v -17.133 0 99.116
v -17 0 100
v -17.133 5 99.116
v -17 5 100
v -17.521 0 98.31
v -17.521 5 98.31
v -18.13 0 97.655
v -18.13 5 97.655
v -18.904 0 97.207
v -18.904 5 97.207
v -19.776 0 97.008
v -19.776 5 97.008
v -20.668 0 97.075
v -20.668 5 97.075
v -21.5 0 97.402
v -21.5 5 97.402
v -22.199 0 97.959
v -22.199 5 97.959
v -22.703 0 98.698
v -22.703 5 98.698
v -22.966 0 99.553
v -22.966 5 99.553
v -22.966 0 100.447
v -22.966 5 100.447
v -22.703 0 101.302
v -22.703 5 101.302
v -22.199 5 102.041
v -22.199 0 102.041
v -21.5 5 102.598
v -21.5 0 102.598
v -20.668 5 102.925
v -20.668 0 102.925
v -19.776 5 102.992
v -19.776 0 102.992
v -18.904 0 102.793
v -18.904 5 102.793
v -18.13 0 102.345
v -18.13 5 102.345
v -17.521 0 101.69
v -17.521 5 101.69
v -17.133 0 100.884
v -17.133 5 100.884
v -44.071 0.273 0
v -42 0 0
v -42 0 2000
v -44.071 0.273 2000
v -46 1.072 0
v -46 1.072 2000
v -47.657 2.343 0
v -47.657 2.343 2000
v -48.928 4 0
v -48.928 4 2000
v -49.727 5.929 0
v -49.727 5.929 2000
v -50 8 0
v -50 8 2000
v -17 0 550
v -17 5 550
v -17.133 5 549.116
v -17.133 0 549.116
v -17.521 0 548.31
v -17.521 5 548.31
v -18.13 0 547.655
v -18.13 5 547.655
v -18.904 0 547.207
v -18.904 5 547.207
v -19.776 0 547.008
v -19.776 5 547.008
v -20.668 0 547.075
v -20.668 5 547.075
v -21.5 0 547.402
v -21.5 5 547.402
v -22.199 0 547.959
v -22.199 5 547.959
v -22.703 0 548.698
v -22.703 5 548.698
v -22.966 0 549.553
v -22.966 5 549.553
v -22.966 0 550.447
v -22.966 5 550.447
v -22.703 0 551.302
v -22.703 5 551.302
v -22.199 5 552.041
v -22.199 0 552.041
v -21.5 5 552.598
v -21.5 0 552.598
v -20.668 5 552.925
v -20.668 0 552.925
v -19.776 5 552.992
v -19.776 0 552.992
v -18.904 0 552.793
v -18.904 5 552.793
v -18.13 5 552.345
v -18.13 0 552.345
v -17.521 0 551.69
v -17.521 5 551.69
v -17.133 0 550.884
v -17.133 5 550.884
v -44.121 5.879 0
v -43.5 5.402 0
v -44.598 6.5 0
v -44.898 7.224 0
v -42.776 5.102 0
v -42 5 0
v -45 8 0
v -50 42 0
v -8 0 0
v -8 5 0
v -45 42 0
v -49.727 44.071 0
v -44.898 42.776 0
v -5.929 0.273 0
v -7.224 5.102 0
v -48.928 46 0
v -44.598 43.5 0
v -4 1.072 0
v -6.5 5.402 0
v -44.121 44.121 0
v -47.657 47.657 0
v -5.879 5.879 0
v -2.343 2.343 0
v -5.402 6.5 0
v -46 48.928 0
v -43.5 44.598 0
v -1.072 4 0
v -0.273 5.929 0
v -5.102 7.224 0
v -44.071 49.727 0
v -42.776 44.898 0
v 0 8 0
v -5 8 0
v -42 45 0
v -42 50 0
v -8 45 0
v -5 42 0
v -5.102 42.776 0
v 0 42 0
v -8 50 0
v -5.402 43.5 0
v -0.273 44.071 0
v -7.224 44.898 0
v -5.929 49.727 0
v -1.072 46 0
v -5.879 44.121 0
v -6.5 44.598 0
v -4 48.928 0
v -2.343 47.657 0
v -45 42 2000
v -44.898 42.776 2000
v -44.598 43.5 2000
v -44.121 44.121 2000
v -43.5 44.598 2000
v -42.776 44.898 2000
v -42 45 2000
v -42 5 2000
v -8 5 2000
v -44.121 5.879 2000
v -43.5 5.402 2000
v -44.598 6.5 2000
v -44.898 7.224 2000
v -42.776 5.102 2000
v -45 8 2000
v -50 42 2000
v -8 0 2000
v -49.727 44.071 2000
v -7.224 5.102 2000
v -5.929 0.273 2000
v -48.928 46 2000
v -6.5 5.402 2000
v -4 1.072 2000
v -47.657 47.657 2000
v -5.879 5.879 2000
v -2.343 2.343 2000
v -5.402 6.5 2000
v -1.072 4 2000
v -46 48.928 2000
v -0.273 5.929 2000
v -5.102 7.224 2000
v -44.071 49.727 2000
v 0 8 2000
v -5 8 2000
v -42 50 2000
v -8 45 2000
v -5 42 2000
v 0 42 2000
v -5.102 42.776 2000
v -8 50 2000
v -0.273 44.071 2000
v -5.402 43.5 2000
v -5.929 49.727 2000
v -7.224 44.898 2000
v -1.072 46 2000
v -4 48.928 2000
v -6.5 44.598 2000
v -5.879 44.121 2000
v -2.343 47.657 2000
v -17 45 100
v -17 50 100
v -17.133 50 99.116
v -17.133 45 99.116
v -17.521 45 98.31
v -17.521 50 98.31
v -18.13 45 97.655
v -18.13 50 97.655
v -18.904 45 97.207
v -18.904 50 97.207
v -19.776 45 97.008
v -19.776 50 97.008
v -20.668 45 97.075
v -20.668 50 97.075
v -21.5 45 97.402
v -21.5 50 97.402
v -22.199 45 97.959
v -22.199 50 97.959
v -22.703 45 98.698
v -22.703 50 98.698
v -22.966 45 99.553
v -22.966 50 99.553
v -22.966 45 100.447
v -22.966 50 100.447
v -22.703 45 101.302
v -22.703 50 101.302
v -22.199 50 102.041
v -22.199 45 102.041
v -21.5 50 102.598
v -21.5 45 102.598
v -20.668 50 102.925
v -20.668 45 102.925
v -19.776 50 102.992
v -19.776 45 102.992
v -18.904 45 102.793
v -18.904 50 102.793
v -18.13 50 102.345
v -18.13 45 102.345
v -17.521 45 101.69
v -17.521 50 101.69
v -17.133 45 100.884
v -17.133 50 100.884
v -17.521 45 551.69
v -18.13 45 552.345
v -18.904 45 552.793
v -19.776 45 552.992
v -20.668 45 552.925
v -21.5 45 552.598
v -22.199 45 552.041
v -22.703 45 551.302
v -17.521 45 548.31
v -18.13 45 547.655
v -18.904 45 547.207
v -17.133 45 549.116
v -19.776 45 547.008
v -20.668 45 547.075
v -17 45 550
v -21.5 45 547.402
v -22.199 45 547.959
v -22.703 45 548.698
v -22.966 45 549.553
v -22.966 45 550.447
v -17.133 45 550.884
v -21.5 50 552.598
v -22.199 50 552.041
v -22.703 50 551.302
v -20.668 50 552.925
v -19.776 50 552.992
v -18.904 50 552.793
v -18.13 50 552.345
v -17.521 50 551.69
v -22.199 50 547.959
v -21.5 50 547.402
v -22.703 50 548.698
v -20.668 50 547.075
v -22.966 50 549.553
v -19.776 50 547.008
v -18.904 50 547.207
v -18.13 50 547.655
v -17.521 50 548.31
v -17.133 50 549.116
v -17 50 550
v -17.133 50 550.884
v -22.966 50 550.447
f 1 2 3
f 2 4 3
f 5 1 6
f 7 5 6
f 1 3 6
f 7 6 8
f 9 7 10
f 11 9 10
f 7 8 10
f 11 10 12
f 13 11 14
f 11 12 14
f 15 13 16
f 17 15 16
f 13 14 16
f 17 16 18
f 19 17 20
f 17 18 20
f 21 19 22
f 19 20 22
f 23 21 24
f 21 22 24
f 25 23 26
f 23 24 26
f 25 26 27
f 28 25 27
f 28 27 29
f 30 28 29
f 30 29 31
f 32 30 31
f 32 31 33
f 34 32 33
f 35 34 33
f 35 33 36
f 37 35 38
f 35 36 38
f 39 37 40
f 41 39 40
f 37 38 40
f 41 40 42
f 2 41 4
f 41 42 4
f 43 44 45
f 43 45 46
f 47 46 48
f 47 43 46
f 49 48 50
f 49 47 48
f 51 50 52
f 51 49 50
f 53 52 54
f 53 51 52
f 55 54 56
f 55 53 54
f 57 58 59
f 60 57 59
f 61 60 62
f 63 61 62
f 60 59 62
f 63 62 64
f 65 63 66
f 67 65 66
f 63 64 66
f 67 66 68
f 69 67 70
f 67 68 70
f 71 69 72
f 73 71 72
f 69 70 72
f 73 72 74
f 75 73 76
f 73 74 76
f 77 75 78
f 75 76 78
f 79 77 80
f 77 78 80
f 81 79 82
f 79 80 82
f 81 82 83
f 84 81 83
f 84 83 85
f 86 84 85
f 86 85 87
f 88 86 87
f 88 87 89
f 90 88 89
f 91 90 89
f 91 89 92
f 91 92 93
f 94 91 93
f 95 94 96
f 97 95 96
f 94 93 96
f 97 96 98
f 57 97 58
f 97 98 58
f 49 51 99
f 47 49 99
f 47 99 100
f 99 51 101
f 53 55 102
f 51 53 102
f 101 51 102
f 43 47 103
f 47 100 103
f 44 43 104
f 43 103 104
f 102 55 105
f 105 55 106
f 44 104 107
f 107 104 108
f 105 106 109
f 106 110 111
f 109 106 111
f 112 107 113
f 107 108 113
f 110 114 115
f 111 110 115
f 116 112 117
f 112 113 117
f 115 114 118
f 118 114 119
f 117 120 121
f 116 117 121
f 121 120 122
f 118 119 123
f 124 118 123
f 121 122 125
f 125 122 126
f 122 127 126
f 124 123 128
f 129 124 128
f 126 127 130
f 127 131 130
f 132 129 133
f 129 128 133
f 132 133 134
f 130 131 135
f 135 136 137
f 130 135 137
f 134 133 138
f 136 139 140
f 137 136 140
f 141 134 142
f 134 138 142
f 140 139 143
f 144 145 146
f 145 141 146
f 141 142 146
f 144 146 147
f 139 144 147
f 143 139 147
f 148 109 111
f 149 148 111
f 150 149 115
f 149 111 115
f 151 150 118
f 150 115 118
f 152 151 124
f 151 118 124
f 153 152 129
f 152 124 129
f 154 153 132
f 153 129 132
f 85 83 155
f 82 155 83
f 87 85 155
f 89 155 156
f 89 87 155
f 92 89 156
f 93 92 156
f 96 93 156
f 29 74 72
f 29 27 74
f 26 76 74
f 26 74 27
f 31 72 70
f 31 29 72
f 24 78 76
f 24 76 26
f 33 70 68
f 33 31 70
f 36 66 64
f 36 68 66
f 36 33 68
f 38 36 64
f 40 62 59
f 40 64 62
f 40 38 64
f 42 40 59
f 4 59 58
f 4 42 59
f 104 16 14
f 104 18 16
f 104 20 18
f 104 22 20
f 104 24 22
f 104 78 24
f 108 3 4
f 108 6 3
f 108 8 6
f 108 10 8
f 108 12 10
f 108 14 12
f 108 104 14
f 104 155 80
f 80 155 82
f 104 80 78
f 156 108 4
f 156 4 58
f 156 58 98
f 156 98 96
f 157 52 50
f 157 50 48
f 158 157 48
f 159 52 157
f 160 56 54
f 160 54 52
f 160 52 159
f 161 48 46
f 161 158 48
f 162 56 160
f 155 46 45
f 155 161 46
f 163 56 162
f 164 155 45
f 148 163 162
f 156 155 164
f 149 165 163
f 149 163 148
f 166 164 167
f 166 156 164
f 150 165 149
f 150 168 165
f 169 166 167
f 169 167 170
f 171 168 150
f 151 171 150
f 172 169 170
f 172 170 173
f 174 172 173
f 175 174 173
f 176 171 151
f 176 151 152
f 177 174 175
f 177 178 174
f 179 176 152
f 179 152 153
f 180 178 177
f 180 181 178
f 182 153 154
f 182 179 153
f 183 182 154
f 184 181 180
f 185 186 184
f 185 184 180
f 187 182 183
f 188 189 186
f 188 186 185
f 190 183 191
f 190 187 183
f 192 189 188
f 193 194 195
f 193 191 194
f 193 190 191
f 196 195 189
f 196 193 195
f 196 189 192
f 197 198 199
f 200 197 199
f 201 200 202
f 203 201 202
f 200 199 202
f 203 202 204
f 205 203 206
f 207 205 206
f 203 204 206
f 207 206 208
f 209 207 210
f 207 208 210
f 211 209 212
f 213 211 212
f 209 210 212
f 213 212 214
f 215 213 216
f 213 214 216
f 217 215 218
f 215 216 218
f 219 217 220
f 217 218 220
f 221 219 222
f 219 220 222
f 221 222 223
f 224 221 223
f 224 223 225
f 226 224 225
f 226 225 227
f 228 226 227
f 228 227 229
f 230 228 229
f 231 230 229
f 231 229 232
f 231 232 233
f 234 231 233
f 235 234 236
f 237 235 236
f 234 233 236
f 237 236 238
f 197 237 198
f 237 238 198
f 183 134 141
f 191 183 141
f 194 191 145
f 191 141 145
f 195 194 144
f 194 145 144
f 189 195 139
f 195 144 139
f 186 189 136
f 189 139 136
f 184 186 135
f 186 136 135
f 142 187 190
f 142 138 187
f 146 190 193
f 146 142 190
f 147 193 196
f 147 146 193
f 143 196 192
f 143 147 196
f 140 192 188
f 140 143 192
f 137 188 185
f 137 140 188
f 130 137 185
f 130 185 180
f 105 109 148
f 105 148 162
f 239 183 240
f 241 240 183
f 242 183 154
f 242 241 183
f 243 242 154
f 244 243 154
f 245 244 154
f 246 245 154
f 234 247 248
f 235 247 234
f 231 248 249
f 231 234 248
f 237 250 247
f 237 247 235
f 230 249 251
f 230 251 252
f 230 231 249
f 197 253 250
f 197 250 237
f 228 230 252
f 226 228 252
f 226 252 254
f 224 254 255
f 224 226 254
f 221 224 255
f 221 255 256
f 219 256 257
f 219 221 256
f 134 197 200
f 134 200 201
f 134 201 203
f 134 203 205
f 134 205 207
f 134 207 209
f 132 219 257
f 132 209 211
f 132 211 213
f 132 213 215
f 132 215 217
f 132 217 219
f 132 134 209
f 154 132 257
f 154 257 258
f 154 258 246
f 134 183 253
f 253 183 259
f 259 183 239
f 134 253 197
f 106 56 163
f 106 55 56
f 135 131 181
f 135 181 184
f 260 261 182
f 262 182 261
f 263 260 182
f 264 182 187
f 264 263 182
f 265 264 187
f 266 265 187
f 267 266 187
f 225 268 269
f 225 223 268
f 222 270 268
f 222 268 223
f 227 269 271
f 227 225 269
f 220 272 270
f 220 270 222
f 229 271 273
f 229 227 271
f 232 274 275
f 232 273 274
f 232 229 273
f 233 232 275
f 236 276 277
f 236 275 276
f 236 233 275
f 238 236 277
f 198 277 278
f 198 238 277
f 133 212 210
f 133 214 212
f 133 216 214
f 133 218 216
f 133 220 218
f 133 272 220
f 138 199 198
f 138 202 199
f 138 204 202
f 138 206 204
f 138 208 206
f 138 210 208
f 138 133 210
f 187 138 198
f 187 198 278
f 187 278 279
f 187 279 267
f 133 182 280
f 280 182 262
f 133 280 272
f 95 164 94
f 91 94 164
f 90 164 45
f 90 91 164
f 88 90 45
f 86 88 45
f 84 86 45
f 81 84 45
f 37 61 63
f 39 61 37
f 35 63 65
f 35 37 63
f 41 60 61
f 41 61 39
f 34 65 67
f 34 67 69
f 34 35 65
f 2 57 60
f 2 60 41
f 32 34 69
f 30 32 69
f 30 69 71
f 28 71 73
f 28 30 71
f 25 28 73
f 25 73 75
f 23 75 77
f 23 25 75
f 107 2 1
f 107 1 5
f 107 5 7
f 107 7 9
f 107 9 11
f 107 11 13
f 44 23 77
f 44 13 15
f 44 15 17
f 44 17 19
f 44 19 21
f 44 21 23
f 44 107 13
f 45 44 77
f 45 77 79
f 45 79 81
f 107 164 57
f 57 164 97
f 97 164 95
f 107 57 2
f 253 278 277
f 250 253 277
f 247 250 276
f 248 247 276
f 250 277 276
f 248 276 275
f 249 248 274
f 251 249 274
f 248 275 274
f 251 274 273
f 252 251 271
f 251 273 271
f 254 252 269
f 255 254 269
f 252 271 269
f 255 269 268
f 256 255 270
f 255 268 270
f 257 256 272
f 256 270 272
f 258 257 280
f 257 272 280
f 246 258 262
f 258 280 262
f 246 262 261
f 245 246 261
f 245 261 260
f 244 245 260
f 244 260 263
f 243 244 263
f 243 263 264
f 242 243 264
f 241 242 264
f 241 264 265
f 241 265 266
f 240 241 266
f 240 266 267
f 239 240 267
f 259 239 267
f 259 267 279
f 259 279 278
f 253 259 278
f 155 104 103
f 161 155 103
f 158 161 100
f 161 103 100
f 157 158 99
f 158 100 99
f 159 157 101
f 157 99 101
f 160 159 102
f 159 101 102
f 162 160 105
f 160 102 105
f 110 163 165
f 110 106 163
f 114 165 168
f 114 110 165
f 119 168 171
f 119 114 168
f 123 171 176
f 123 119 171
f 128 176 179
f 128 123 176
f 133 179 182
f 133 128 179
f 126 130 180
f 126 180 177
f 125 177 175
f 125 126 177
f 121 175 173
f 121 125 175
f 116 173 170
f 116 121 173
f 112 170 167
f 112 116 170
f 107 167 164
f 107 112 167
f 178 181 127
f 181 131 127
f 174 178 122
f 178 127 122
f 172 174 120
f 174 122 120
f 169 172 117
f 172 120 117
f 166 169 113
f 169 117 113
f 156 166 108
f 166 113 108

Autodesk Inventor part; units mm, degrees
ref_plane "YZ Plane" through (0, 0, 0) normal (1, 0, 0) x (0, 1, 0)
ref_plane "XZ Plane" through (0, 0, 0) normal (0, 1, 0) x (-1, 0, 0)
ref_plane "XY Plane" through (0, 0, 0) normal (0, 0, 1) x (1, 0, 0)
sketch "Sketch1" plane through (0, 0, 0) normal (0, 0, 1) x (1, 0, 0)
  line L0 (-8, 0) -> (-42, 0)
  line L1 (-50, 8) -> (-50, 42)
  line L2 (-42, 50) -> (-8, 50)
  line L3 (0, 42) -> (0, 8)
  arc A0 (-42, 50) -> (-50, 42) centre (-42, 42) ccw
  arc A1 (0, 42) -> (-8, 50) centre (-8, 42) ccw
  arc A2 (-8, 0) -> (0, 8) centre (-8, 8) ccw
  arc A3 (-50, 8) -> (-42, 0) centre (-42, 8) ccw
  line L4 (-45, 42) -> (-45, 8)
  arc A4 (-45, 8) -> (-42, 5) centre (-42, 8) ccw
  line L5 (-42, 5) -> (-8, 5)
  arc A5 (-8, 5) -> (-5, 8) centre (-8, 8) ccw
  line L6 (-5, 8) -> (-5, 42)
  arc A6 (-5, 42) -> (-8, 45) centre (-8, 42) ccw
  line L7 (-8, 45) -> (-42, 45)
  arc A7 (-42, 45) -> (-45, 42) centre (-42, 42) ccw
  point P0 (0, 0)
  point P1 (-50, 50)
  point P2 (-50, 0)
  point P3 (0, 50)
  dimension "d0" = 50
  dimension "d1" = 50
  dimension "d2" = 8
  dimension "d3" = 5
extrude "Extrusion1" add sketch "Sketch1" along normal blind 2000
sketch "Sketch2" plane through (-42, 50, 0) normal (0, 1, 0) x (1, 0, 0)
  line L0 (0, 0) -> (34, 0) projected
  line L1 (34, 0) -> (34, -54.5049)
  line L2 (34, 0) -> (34, -2000) projected
  circle A0 centre (22, -100) radius 3
  point P0 (42, 0)
  point P1 (22, -550)
  point P2 (22, -1000)
  point P3 (22, -1450)
  dimension "d6" = 20
  dimension "d7" = 100
  dimension "d10" = 450
  dimension "d22" = 6
extrude "Extrusion2" cut sketch "Sketch2" against normal through all
pattern_linear "Rectangular Pattern1" count 2 spacing 450 along (0, 0, 1) of "Extrusion2"
ref_plane "Work Plane1" through (-20, 50, 550) normal (1, 0, 0) x (0, -1, 0)
properties part number "50x50x5"
